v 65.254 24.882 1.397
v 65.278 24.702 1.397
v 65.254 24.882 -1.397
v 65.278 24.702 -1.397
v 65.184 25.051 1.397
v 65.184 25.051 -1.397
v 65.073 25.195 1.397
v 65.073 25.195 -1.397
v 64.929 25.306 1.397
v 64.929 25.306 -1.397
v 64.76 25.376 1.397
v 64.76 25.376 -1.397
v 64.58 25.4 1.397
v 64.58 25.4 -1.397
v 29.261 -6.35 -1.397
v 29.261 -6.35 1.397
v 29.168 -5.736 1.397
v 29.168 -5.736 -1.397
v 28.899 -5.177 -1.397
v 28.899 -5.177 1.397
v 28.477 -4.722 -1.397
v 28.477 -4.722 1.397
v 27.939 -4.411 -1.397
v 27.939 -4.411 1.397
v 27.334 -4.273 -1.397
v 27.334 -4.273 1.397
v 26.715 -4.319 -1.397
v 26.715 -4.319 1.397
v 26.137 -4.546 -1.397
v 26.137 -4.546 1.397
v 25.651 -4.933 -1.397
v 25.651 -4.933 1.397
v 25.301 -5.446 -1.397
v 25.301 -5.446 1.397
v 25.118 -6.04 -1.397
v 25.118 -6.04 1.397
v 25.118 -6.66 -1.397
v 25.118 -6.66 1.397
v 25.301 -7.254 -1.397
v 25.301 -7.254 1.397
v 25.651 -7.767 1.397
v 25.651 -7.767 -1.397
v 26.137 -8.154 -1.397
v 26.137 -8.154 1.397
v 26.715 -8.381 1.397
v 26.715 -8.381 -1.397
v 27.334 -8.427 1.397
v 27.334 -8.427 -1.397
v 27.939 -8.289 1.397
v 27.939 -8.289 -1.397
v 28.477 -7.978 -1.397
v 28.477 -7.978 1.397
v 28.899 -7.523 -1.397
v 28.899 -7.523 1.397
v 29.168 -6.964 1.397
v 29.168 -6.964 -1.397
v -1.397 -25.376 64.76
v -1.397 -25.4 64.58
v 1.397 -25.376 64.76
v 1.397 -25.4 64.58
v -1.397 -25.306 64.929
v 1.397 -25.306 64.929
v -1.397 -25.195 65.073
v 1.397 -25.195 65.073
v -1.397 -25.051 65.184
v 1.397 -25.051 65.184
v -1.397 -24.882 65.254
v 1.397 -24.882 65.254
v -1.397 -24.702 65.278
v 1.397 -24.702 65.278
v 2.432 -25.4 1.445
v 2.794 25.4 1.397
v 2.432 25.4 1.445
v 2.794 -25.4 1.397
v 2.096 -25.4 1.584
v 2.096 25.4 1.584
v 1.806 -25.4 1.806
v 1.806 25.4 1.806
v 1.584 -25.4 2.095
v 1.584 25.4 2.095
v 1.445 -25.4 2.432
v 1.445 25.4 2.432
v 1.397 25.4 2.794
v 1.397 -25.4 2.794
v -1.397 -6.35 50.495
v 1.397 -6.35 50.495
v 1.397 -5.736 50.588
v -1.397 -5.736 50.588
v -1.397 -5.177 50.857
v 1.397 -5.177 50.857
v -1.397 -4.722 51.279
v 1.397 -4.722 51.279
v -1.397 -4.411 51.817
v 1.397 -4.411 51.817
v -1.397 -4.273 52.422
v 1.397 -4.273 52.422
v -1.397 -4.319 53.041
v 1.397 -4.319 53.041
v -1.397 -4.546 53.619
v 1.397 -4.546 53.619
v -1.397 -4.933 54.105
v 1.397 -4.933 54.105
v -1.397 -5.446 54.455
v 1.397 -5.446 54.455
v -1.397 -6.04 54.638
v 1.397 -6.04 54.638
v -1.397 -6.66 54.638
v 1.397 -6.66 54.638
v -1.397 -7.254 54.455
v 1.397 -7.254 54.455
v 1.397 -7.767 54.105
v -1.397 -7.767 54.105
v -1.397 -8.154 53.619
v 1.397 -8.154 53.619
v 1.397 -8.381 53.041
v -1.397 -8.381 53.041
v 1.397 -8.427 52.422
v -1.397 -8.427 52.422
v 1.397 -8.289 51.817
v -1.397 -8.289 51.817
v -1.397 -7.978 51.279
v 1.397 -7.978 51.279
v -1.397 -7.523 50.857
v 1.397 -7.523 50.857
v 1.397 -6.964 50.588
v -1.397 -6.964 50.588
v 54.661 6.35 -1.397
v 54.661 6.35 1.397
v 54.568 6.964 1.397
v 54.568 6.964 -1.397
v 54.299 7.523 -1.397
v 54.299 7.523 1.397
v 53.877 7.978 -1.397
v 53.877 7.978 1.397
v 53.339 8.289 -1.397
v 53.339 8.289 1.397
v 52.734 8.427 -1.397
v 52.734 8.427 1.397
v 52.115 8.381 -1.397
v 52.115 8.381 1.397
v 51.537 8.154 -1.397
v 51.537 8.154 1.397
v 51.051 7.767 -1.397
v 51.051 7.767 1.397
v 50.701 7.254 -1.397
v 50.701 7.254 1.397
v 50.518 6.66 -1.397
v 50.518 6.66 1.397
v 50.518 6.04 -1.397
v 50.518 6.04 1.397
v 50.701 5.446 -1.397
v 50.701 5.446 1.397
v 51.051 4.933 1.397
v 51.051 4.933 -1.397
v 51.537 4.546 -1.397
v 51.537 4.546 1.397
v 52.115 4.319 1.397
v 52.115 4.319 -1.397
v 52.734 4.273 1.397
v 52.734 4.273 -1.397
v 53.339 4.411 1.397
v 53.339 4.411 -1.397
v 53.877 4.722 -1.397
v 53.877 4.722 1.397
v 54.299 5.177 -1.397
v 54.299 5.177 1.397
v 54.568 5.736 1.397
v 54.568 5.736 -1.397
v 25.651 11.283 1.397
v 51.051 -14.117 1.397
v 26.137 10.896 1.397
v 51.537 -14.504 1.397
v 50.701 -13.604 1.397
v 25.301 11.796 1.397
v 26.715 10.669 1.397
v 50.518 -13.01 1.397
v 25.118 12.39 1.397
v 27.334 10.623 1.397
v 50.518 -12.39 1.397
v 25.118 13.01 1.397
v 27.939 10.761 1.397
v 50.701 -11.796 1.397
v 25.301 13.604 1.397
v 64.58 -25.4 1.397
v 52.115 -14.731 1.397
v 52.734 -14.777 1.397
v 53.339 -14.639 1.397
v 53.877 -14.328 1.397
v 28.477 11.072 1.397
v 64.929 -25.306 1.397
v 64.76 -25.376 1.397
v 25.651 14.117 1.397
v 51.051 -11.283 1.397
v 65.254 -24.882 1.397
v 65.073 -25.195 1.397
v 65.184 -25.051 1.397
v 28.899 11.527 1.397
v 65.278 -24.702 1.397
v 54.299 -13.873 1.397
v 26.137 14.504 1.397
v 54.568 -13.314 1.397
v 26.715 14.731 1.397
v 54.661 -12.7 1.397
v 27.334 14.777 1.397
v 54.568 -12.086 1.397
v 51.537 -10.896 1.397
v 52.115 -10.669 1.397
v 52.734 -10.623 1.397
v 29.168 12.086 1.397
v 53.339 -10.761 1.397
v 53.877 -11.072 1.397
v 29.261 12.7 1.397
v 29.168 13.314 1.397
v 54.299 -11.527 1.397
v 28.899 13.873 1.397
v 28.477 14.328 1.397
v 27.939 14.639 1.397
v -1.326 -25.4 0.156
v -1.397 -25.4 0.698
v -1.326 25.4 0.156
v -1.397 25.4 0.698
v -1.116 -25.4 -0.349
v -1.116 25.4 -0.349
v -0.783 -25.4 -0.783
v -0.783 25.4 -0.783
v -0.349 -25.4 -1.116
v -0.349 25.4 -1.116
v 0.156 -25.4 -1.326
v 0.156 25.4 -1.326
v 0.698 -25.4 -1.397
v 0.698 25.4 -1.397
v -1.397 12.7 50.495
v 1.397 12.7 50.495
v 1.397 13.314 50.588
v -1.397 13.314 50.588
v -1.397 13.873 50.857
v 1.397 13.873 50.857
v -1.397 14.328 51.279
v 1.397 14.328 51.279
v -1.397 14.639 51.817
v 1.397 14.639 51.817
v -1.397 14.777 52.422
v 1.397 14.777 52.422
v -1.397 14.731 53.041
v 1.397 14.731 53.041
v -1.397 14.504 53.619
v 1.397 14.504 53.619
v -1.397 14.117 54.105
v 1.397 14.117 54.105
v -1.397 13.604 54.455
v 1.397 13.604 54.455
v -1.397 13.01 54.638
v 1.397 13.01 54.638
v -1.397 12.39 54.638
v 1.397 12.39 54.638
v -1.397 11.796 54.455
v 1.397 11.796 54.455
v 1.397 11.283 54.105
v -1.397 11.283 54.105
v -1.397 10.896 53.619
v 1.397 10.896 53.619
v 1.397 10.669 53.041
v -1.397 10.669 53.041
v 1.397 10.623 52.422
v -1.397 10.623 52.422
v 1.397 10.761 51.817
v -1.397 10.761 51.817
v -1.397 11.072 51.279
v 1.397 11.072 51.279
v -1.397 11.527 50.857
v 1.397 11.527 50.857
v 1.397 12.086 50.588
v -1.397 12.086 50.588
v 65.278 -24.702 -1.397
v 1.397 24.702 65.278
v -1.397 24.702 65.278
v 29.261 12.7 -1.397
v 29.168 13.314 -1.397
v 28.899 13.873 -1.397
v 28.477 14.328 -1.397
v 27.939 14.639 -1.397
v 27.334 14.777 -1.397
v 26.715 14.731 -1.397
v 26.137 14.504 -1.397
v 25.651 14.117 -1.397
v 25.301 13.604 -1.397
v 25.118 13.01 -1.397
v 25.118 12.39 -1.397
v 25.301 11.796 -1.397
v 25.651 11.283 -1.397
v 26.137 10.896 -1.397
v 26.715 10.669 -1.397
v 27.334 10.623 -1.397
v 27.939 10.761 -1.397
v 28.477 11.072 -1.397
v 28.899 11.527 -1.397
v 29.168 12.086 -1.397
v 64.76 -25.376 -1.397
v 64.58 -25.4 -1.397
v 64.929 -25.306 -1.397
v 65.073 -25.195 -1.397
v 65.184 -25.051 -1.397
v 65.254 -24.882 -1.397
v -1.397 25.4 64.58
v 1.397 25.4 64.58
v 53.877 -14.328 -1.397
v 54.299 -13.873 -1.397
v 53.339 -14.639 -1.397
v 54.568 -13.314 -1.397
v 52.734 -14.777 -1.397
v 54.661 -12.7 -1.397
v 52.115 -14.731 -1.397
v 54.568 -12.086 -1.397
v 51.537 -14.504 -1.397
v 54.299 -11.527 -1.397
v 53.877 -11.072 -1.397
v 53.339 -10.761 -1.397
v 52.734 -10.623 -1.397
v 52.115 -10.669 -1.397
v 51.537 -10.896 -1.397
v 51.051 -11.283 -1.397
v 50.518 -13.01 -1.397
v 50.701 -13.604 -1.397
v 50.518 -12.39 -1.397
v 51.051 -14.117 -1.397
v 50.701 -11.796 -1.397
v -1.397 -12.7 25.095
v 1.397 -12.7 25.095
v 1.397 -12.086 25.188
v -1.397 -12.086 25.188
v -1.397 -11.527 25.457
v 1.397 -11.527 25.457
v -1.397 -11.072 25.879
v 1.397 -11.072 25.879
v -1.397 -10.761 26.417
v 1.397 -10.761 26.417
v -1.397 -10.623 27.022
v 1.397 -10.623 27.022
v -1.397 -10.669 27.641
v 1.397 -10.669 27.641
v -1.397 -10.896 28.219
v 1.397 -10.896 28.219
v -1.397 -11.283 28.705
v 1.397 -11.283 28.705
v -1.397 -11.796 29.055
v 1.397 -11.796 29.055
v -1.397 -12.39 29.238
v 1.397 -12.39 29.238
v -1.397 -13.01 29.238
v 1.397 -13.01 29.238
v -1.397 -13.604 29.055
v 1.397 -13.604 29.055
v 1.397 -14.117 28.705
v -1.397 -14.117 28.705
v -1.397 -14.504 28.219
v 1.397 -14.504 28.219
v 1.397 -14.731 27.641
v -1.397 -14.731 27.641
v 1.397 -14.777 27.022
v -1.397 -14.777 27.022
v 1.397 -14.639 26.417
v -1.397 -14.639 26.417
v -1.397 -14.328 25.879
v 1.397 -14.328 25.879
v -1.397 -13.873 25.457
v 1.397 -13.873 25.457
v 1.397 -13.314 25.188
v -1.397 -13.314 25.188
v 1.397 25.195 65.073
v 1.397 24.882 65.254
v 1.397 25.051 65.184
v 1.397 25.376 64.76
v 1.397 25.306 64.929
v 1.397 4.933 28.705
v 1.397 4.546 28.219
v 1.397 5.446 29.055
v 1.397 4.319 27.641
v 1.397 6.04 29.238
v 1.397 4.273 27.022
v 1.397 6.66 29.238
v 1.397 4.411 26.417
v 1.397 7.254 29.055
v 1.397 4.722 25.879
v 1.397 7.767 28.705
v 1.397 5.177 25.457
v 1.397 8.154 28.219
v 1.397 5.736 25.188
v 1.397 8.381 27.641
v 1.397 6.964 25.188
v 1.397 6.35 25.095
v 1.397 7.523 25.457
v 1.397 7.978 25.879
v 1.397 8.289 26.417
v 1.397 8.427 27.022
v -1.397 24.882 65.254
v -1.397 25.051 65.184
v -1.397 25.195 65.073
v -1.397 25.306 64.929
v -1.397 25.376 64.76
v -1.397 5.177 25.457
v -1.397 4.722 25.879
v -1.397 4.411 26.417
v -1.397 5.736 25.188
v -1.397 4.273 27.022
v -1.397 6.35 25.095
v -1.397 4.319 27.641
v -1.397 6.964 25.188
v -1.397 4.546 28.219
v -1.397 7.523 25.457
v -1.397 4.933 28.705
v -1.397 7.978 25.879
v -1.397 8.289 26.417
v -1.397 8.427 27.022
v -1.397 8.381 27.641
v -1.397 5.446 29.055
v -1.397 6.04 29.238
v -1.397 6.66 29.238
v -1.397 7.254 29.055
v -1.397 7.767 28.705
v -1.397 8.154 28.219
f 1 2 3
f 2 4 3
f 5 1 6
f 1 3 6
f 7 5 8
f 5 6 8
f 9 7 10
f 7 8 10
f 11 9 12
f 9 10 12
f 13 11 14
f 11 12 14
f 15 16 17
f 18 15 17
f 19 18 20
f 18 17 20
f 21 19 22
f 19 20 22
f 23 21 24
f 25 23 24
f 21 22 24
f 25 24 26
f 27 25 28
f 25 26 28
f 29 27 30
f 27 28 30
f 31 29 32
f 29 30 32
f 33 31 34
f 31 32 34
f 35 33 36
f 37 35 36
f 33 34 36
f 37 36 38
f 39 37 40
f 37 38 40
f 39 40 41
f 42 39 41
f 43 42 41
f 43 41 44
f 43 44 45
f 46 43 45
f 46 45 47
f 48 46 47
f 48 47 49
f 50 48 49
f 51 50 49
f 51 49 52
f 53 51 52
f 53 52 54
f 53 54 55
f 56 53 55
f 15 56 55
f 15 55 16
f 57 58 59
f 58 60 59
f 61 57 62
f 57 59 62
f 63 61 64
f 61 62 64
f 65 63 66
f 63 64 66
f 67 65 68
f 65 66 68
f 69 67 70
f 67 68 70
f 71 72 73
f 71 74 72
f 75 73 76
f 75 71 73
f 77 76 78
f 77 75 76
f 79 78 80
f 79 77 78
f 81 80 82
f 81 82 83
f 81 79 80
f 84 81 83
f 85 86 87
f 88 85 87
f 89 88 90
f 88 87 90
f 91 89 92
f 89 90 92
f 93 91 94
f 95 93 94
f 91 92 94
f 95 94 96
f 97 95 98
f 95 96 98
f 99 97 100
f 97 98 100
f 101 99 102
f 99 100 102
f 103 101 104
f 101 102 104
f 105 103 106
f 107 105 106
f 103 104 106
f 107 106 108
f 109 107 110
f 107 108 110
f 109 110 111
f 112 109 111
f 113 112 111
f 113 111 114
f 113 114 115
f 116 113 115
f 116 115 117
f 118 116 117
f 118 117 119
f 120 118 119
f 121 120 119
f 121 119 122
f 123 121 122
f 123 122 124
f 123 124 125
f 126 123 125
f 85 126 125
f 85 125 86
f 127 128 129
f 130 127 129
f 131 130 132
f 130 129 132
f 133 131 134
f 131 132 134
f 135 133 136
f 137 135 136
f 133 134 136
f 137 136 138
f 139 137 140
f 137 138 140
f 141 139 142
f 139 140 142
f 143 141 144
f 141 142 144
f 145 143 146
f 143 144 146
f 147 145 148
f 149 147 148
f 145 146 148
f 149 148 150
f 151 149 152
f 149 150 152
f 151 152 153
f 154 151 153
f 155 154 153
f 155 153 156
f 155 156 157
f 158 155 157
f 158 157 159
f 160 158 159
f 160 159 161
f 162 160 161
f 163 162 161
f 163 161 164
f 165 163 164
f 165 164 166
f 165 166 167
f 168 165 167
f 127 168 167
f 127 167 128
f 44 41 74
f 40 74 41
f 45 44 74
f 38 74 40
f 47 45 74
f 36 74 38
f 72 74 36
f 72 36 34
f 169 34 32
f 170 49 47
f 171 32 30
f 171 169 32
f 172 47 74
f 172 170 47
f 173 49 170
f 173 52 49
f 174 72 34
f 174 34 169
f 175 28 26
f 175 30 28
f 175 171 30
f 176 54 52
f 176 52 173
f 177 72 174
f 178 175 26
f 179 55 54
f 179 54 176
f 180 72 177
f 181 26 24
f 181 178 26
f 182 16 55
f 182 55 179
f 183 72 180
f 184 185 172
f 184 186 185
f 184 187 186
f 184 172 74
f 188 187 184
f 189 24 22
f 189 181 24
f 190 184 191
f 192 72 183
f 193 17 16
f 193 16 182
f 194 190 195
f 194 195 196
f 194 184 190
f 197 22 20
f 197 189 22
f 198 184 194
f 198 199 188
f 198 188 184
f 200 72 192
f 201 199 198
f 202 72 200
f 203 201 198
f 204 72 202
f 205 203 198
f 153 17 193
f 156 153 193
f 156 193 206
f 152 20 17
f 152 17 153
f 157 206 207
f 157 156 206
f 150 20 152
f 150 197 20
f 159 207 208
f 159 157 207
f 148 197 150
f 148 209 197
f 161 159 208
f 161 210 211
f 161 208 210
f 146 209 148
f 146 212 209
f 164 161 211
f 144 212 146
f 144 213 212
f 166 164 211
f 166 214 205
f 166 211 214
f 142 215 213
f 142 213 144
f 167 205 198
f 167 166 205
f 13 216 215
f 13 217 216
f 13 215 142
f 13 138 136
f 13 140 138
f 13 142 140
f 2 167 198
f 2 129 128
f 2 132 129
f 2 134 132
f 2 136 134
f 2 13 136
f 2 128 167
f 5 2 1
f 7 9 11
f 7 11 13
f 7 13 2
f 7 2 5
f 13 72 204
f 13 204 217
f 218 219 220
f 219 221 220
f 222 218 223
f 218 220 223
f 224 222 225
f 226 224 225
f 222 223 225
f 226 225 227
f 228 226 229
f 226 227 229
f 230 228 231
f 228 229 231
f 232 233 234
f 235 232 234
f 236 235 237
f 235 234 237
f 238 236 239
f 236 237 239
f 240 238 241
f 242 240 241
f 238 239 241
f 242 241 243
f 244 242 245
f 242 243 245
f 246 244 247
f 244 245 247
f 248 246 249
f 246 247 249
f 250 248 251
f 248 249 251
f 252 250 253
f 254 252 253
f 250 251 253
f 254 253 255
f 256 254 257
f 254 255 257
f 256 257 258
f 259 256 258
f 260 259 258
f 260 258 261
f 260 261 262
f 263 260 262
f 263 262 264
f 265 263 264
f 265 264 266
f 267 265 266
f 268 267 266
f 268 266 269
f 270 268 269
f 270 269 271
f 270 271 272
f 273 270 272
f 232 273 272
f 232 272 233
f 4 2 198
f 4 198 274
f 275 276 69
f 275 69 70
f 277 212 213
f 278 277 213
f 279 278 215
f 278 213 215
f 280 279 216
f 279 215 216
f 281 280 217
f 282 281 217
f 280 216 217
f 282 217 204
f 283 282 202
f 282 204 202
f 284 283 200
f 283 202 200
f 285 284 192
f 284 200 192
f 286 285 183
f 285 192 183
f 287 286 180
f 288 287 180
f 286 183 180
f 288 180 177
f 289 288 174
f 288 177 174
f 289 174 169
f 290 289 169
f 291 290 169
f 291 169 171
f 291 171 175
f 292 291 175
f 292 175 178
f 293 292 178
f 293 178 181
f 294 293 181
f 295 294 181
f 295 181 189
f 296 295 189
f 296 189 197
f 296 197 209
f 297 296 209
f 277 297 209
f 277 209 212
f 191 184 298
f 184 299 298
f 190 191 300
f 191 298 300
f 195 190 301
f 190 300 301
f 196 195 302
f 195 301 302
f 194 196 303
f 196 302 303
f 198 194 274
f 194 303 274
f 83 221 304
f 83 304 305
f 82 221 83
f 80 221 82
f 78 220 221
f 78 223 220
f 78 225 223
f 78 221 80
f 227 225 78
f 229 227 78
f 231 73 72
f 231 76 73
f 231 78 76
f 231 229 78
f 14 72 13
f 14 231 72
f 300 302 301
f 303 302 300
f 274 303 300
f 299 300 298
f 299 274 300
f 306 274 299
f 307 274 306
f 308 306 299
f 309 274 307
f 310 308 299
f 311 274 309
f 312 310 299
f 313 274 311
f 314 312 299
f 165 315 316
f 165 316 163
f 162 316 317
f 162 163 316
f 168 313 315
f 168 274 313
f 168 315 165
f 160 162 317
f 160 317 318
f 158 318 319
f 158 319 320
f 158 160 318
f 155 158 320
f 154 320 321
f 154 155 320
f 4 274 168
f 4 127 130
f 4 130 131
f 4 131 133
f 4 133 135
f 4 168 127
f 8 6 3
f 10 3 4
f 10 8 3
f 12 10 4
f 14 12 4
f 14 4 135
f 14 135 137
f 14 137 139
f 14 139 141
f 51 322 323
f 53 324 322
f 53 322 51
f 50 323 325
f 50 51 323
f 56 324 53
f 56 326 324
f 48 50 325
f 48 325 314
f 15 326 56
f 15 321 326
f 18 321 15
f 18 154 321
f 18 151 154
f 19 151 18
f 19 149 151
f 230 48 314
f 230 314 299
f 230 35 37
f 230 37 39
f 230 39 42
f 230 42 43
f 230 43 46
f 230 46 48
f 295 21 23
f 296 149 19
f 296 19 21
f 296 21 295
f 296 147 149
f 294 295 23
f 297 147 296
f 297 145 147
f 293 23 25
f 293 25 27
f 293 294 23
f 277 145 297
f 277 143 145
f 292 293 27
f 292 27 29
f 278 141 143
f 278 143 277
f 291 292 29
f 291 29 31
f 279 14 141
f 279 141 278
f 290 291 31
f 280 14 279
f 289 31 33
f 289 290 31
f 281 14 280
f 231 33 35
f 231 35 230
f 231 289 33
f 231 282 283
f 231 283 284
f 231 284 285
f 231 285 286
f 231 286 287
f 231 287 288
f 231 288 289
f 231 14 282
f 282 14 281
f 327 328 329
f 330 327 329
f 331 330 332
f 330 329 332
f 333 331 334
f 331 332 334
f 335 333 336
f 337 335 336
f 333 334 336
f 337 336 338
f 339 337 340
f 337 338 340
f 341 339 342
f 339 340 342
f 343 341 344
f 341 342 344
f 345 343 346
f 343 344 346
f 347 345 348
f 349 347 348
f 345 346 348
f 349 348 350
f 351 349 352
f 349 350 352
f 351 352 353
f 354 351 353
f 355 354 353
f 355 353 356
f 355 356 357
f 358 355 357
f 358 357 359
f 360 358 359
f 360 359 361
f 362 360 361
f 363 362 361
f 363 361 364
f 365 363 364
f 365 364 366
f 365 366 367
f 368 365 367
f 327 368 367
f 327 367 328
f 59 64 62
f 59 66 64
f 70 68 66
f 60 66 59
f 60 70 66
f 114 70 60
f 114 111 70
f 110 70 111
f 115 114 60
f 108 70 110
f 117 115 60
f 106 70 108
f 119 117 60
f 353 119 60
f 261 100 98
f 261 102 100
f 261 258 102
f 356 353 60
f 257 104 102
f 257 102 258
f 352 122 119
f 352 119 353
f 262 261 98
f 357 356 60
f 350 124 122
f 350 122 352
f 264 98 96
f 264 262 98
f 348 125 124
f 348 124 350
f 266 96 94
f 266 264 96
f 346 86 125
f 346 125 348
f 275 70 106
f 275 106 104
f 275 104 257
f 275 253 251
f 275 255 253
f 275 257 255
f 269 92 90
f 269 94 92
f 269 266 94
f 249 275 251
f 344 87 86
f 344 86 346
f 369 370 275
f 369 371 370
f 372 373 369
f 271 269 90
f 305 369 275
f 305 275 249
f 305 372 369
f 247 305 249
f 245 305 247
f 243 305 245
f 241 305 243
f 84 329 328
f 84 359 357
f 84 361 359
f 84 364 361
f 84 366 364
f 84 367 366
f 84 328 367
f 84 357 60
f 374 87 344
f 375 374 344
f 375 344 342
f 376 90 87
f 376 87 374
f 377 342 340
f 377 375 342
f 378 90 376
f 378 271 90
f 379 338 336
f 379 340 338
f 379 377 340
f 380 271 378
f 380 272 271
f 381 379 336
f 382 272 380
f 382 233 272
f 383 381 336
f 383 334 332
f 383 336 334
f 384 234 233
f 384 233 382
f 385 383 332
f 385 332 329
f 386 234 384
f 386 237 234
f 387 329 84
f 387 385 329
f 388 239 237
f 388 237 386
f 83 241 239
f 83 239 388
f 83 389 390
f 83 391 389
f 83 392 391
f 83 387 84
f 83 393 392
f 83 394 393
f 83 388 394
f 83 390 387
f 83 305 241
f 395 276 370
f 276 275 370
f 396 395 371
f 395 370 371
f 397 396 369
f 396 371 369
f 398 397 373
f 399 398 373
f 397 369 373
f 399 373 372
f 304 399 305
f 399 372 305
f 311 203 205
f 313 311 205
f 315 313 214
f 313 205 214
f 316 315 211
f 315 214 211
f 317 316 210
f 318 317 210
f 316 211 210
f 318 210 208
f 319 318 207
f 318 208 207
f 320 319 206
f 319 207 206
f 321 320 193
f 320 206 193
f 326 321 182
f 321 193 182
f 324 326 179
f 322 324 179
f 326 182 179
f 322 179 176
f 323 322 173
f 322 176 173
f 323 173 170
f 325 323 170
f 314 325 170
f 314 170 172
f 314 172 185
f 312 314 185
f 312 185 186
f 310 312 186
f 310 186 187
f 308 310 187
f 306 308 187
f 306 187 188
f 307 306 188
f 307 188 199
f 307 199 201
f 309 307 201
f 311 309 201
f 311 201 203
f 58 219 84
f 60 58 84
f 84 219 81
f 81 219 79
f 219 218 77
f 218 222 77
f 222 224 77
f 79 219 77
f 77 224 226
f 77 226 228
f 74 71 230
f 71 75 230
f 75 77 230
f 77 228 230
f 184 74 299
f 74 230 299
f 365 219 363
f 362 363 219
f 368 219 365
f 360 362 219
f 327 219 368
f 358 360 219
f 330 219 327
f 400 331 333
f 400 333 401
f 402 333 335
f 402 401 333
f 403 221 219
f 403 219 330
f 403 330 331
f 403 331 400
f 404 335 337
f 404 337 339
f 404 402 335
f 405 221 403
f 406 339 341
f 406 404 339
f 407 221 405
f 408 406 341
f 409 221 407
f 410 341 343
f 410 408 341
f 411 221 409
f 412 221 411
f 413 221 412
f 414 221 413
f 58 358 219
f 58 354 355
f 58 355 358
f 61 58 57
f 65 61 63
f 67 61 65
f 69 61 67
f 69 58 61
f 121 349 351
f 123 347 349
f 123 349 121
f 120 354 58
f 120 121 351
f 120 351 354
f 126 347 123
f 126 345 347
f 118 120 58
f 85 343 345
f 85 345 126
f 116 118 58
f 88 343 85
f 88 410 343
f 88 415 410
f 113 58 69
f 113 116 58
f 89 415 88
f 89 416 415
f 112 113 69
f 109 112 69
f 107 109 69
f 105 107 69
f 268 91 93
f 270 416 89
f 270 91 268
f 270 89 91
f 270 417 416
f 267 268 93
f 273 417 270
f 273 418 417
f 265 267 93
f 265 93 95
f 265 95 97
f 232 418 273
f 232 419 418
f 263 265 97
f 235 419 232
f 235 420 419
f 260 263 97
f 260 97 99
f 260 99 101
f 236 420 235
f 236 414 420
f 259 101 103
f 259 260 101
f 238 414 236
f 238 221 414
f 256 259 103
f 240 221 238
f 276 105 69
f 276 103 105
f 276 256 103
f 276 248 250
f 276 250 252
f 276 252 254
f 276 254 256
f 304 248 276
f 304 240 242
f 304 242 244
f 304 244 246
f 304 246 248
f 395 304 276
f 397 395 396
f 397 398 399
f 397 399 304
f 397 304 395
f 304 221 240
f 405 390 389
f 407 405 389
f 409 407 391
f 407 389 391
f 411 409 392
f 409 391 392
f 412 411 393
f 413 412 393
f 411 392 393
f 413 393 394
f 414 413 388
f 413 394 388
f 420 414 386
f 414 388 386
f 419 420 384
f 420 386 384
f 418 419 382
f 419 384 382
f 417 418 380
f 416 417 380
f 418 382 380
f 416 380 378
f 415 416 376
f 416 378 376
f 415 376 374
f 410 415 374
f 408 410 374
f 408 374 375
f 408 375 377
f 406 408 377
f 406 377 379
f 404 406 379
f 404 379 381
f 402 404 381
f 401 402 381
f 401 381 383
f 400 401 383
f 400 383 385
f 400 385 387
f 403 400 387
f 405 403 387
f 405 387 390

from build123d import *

# Parameters (mm, degrees)
BOSS_EXTRUDE1_DEPTH = 25.4
FILLET1_R           = 2.0955
FILLET2_R           = 1.397
FILLET3_R           = 0.6985
CUT_EXTRUDE1_REACH  = 4.794
SKETCH4_R           = 2.0828
CUT_EXTRUDE2_REACH  = 4.794
SKETCH5_R           = 2.0828


with BuildPart() as part:
    # Sketch3 → Boss-Extrude1 (new body, symmetric)
    with BuildSketch(Plane(origin=(0, 0, 0), x_dir=(1, 0, 0), z_dir=(0, 1, 0))):
        Polygon((1.397, -1.397), (65.278, -1.397), (65.278, 1.397), (-1.397, 1.397), (-1.397, -65.278), (1.397, -65.278), align=None)
    extrude(amount=BOSS_EXTRUDE1_DEPTH, both=True)

    # Fillet1
    fillet1_edges = [part.edges().sort_by_distance(p)[0] for p in [
        (-1.397, 0, -1.397),
    ]]
    fillet(fillet1_edges, radius=FILLET1_R)

    # Fillet2
    fillet2_edges = [part.edges().sort_by_distance(p)[0] for p in [
        (1.397, 0, 1.397),
    ]]
    fillet(fillet2_edges, radius=FILLET2_R)

    # Fillet3
    fillet3_edges = [part.edges().sort_by_distance(p)[0] for p in [
        (65.278, 25.4, 0),
        (0, 25.4, 65.278),
        (0, -25.4, 65.278),
        (65.278, -25.4, 0),
    ]]
    fillet(fillet3_edges, radius=FILLET3_R)

    # Sketch4 → Cut-Extrude1 (cut, up to next)
    with BuildSketch(Plane(origin=(1.397, 0, 0), x_dir=(0, 0, -1), z_dir=(1, 0, 0)), mode=Mode.PRIVATE) as cut_extrude1_sk1:
        with Locations((-52.578, -6.35)):
            Circle(SKETCH4_R)
    cut_extrude1_tool1 = extrude(cut_extrude1_sk1.sketch, amount=-CUT_EXTRUDE1_REACH, mode=Mode.PRIVATE) & part.part
    add(cut_extrude1_tool1.solids().sort_by_distance((1.397, -6.35, 52.578))[0], mode=Mode.SUBTRACT)
    # Sketch4 → Cut-Extrude1 (cut, up to next)
    with BuildSketch(Plane(origin=(1.397, 0, 0), x_dir=(0, 0, -1), z_dir=(1, 0, 0)), mode=Mode.PRIVATE) as cut_extrude1_sk2:
        with Locations((-27.178, 6.35)):
            Circle(SKETCH4_R)
    cut_extrude1_tool2 = extrude(cut_extrude1_sk2.sketch, amount=-CUT_EXTRUDE1_REACH, mode=Mode.PRIVATE) & part.part
    add(cut_extrude1_tool2.solids().sort_by_distance((1.397, 6.35, 27.178))[0], mode=Mode.SUBTRACT)
    # Sketch4 → Cut-Extrude1 (cut, up to next)
    with BuildSketch(Plane(origin=(1.397, 0, 0), x_dir=(0, 0, -1), z_dir=(1, 0, 0)), mode=Mode.PRIVATE) as cut_extrude1_sk3:
        with Locations((-27.178, -12.7)):
            Circle(SKETCH4_R)
    cut_extrude1_tool3 = extrude(cut_extrude1_sk3.sketch, amount=-CUT_EXTRUDE1_REACH, mode=Mode.PRIVATE) & part.part
    add(cut_extrude1_tool3.solids().sort_by_distance((1.397, -12.7, 27.178))[0], mode=Mode.SUBTRACT)
    # Sketch4 → Cut-Extrude1 (cut, up to next)
    with BuildSketch(Plane(origin=(1.397, 0, 0), x_dir=(0, 0, -1), z_dir=(1, 0, 0)), mode=Mode.PRIVATE) as cut_extrude1_sk4:
        with Locations((-52.578, 12.7)):
            Circle(SKETCH4_R)
    cut_extrude1_tool4 = extrude(cut_extrude1_sk4.sketch, amount=-CUT_EXTRUDE1_REACH, mode=Mode.PRIVATE) & part.part
    add(cut_extrude1_tool4.solids().sort_by_distance((1.397, 12.7, 52.578))[0], mode=Mode.SUBTRACT)

    # Sketch5 → Cut-Extrude2 (cut, up to next)
    with BuildSketch(Plane.XY.offset(1.397), mode=Mode.PRIVATE) as cut_extrude2_sk1:
        with Locations((27.178, 12.7)):
            Circle(SKETCH5_R)
    cut_extrude2_tool1 = extrude(cut_extrude2_sk1.sketch, amount=-CUT_EXTRUDE2_REACH, mode=Mode.PRIVATE) & part.part
    add(cut_extrude2_tool1.solids().sort_by_distance((27.178, 12.7, 1.397))[0], mode=Mode.SUBTRACT)
    # Sketch5 → Cut-Extrude2 (cut, up to next)
    with BuildSketch(Plane.XY.offset(1.397), mode=Mode.PRIVATE) as cut_extrude2_sk2:
        with Locations((27.178, -6.35)):
            Circle(SKETCH5_R)
    cut_extrude2_tool2 = extrude(cut_extrude2_sk2.sketch, amount=-CUT_EXTRUDE2_REACH, mode=Mode.PRIVATE) & part.part
    add(cut_extrude2_tool2.solids().sort_by_distance((27.178, -6.35, 1.397))[0], mode=Mode.SUBTRACT)
    # Sketch5 → Cut-Extrude2 (cut, up to next)
    with BuildSketch(Plane.XY.offset(1.397), mode=Mode.PRIVATE) as cut_extrude2_sk3:
        with Locations((52.578, -12.7)):
            Circle(SKETCH5_R)
    cut_extrude2_tool3 = extrude(cut_extrude2_sk3.sketch, amount=-CUT_EXTRUDE2_REACH, mode=Mode.PRIVATE) & part.part
    add(cut_extrude2_tool3.solids().sort_by_distance((52.578, -12.7, 1.397))[0], mode=Mode.SUBTRACT)
    # Sketch5 → Cut-Extrude2 (cut, up to next)
    with BuildSketch(Plane.XY.offset(1.397), mode=Mode.PRIVATE) as cut_extrude2_sk4:
        with Locations((52.578, 6.35)):
            Circle(SKETCH5_R)
    cut_extrude2_tool4 = extrude(cut_extrude2_sk4.sketch, amount=-CUT_EXTRUDE2_REACH, mode=Mode.PRIVATE) & part.part
    add(cut_extrude2_tool4.solids().sort_by_distance((52.578, 6.35, 1.397))[0], mode=Mode.SUBTRACT)


solid = part.part
